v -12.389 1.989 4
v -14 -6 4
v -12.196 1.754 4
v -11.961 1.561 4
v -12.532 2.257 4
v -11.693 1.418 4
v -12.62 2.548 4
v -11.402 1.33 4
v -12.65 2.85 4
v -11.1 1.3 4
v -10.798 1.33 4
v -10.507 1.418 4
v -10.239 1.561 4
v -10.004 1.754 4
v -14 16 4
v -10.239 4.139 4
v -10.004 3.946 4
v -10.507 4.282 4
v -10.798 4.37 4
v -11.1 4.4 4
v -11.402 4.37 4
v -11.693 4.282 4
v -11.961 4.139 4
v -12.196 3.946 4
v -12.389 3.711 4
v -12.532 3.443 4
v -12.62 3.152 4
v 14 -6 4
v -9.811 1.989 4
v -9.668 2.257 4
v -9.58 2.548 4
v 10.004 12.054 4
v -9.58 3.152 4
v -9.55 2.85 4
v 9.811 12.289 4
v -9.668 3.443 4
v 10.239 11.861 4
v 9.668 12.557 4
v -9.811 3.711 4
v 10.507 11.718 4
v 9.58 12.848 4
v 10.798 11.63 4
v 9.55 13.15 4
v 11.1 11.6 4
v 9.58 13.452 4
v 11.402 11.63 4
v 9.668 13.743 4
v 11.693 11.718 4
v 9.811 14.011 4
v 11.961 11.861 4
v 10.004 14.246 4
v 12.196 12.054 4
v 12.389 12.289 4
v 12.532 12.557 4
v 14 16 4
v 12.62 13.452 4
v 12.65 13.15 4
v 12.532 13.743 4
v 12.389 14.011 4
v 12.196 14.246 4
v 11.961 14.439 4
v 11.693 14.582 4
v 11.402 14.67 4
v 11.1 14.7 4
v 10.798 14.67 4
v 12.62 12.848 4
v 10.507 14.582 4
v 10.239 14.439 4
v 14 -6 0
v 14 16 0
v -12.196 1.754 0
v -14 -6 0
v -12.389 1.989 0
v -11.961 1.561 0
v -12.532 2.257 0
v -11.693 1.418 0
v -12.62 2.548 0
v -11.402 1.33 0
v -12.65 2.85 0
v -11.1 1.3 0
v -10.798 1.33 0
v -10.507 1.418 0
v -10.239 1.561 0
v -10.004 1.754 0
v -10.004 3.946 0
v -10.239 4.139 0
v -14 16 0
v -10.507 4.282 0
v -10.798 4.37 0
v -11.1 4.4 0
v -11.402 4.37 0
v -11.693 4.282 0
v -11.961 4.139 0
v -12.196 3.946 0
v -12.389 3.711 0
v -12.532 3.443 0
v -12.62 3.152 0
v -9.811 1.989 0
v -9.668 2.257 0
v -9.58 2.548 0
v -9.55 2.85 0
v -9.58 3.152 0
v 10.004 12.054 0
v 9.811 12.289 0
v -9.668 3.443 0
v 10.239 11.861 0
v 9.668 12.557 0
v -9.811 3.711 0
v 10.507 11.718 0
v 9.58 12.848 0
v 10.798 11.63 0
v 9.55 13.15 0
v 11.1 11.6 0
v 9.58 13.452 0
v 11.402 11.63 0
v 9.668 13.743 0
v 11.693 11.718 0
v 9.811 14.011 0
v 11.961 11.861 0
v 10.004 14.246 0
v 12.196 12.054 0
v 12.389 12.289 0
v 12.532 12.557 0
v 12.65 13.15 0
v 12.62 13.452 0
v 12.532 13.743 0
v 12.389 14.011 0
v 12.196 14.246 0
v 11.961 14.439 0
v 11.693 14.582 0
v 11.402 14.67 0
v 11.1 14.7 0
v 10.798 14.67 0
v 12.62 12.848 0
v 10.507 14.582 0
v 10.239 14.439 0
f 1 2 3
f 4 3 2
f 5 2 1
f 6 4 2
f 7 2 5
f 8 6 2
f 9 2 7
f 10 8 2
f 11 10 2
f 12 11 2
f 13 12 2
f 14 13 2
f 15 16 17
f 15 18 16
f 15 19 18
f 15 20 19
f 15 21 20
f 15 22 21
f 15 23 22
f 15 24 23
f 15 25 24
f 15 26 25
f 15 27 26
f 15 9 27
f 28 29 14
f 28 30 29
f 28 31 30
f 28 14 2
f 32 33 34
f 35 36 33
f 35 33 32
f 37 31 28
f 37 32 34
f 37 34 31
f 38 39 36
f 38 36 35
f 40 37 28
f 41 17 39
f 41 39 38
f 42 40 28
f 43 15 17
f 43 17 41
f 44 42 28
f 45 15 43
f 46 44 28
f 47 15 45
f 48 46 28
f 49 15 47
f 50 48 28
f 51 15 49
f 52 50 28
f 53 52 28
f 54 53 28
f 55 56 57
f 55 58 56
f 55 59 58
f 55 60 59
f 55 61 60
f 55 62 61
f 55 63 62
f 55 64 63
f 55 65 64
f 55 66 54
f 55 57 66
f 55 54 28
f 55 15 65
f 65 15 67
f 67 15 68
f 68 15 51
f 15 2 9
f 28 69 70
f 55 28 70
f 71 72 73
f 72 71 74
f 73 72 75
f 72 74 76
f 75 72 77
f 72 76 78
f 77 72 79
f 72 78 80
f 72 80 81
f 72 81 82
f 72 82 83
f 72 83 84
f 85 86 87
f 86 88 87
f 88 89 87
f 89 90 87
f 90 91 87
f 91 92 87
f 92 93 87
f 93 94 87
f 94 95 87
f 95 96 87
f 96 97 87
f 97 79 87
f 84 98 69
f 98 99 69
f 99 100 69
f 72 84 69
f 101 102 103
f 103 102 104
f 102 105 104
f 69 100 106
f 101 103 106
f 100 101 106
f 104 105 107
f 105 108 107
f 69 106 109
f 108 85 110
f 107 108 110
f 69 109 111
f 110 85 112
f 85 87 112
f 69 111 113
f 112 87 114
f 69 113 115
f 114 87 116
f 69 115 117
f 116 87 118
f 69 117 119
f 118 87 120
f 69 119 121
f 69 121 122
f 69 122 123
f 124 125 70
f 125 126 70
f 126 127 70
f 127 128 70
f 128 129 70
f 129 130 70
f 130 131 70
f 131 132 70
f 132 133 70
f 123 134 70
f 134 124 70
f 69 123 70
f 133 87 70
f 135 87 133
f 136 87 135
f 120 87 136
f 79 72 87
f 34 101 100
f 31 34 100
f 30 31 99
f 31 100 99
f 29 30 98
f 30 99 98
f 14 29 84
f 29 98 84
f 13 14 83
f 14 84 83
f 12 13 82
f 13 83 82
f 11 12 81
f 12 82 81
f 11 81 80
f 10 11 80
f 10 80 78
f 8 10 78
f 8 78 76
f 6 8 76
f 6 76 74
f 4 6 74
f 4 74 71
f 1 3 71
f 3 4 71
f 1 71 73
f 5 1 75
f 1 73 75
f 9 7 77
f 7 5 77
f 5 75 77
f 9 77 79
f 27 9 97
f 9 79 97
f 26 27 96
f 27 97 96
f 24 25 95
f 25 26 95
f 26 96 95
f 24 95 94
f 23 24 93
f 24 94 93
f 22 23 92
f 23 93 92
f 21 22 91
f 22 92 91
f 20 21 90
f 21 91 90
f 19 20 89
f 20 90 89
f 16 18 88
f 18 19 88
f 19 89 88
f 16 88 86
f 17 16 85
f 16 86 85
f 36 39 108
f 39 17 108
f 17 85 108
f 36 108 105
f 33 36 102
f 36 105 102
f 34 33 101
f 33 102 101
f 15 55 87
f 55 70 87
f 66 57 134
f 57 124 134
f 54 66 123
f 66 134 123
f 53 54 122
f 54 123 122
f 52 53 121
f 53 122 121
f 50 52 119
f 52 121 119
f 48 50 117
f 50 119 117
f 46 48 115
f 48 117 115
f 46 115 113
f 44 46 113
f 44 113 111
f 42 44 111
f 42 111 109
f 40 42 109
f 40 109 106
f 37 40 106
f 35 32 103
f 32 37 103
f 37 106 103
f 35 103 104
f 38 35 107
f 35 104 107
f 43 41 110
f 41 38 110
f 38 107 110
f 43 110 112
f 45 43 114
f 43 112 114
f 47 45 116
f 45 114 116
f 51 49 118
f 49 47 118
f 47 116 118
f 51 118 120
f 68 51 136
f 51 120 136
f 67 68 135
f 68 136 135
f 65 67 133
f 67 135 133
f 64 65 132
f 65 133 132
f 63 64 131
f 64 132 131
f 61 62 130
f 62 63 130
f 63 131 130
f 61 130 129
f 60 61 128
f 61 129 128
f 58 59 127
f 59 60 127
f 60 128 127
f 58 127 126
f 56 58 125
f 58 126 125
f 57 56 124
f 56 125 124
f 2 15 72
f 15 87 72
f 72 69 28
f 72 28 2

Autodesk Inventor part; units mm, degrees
ref_plane "YZ Plane" through (0, 0, 0) normal (1, 0, 0) x (0, 1, 0)
ref_plane "XZ Plane" through (0, 0, 0) normal (0, 1, 0) x (-1, 0, 0)
ref_plane "XY Plane" through (0, 0, 0) normal (0, 0, 1) x (1, 0, 0)
sketch "Sketch1" plane through (0, 0, 0) normal (0, 0, 1) x (1, 0, 0)
  line L0 (-14, 0) -> (14, 0)
  line L1 (14, 0) -> (14, 16)
  line L2 (14, 16) -> (-14, 16)
  line L3 (-14, 16) -> (-14, 0)
  circle A0 centre (-11.1, 2.85) radius 1.55
  circle A1 centre (11.1, 13.15) radius 1.55
  line L4 (-11.1, 2.85) -> (-14, 2.85) construction
  line L5 (11.1, 13.15) -> (14, 13.15) construction
  line L6 (11.1, 13.15) -> (11.1, 16) construction
  line L7 (-11.1, 2.85) -> (-11.1, 0) construction
  line L8 (-14, 0) -> (14, 0) construction
  line L9 (14, 0) -> (14, -6)
  line L10 (14, -6) -> (-14, -6)
  line L11 (-14, -6) -> (-14, 0)
  point P0 (0, 0)
  point P1 (0, 0)
  point P2 (14, 0)
  dimension "d0" = 3.1
  dimension "d1" = 22.2
  dimension "d2" = 10.3
  dimension "d3" = 16
  dimension "d4" = 28
  dimension "d5" = 22
extrude "Extrusion1" add sketch "Sketch1" along normal blind 4
properties part number "SwitchHolder_V1" material "Wood (Oak)"
